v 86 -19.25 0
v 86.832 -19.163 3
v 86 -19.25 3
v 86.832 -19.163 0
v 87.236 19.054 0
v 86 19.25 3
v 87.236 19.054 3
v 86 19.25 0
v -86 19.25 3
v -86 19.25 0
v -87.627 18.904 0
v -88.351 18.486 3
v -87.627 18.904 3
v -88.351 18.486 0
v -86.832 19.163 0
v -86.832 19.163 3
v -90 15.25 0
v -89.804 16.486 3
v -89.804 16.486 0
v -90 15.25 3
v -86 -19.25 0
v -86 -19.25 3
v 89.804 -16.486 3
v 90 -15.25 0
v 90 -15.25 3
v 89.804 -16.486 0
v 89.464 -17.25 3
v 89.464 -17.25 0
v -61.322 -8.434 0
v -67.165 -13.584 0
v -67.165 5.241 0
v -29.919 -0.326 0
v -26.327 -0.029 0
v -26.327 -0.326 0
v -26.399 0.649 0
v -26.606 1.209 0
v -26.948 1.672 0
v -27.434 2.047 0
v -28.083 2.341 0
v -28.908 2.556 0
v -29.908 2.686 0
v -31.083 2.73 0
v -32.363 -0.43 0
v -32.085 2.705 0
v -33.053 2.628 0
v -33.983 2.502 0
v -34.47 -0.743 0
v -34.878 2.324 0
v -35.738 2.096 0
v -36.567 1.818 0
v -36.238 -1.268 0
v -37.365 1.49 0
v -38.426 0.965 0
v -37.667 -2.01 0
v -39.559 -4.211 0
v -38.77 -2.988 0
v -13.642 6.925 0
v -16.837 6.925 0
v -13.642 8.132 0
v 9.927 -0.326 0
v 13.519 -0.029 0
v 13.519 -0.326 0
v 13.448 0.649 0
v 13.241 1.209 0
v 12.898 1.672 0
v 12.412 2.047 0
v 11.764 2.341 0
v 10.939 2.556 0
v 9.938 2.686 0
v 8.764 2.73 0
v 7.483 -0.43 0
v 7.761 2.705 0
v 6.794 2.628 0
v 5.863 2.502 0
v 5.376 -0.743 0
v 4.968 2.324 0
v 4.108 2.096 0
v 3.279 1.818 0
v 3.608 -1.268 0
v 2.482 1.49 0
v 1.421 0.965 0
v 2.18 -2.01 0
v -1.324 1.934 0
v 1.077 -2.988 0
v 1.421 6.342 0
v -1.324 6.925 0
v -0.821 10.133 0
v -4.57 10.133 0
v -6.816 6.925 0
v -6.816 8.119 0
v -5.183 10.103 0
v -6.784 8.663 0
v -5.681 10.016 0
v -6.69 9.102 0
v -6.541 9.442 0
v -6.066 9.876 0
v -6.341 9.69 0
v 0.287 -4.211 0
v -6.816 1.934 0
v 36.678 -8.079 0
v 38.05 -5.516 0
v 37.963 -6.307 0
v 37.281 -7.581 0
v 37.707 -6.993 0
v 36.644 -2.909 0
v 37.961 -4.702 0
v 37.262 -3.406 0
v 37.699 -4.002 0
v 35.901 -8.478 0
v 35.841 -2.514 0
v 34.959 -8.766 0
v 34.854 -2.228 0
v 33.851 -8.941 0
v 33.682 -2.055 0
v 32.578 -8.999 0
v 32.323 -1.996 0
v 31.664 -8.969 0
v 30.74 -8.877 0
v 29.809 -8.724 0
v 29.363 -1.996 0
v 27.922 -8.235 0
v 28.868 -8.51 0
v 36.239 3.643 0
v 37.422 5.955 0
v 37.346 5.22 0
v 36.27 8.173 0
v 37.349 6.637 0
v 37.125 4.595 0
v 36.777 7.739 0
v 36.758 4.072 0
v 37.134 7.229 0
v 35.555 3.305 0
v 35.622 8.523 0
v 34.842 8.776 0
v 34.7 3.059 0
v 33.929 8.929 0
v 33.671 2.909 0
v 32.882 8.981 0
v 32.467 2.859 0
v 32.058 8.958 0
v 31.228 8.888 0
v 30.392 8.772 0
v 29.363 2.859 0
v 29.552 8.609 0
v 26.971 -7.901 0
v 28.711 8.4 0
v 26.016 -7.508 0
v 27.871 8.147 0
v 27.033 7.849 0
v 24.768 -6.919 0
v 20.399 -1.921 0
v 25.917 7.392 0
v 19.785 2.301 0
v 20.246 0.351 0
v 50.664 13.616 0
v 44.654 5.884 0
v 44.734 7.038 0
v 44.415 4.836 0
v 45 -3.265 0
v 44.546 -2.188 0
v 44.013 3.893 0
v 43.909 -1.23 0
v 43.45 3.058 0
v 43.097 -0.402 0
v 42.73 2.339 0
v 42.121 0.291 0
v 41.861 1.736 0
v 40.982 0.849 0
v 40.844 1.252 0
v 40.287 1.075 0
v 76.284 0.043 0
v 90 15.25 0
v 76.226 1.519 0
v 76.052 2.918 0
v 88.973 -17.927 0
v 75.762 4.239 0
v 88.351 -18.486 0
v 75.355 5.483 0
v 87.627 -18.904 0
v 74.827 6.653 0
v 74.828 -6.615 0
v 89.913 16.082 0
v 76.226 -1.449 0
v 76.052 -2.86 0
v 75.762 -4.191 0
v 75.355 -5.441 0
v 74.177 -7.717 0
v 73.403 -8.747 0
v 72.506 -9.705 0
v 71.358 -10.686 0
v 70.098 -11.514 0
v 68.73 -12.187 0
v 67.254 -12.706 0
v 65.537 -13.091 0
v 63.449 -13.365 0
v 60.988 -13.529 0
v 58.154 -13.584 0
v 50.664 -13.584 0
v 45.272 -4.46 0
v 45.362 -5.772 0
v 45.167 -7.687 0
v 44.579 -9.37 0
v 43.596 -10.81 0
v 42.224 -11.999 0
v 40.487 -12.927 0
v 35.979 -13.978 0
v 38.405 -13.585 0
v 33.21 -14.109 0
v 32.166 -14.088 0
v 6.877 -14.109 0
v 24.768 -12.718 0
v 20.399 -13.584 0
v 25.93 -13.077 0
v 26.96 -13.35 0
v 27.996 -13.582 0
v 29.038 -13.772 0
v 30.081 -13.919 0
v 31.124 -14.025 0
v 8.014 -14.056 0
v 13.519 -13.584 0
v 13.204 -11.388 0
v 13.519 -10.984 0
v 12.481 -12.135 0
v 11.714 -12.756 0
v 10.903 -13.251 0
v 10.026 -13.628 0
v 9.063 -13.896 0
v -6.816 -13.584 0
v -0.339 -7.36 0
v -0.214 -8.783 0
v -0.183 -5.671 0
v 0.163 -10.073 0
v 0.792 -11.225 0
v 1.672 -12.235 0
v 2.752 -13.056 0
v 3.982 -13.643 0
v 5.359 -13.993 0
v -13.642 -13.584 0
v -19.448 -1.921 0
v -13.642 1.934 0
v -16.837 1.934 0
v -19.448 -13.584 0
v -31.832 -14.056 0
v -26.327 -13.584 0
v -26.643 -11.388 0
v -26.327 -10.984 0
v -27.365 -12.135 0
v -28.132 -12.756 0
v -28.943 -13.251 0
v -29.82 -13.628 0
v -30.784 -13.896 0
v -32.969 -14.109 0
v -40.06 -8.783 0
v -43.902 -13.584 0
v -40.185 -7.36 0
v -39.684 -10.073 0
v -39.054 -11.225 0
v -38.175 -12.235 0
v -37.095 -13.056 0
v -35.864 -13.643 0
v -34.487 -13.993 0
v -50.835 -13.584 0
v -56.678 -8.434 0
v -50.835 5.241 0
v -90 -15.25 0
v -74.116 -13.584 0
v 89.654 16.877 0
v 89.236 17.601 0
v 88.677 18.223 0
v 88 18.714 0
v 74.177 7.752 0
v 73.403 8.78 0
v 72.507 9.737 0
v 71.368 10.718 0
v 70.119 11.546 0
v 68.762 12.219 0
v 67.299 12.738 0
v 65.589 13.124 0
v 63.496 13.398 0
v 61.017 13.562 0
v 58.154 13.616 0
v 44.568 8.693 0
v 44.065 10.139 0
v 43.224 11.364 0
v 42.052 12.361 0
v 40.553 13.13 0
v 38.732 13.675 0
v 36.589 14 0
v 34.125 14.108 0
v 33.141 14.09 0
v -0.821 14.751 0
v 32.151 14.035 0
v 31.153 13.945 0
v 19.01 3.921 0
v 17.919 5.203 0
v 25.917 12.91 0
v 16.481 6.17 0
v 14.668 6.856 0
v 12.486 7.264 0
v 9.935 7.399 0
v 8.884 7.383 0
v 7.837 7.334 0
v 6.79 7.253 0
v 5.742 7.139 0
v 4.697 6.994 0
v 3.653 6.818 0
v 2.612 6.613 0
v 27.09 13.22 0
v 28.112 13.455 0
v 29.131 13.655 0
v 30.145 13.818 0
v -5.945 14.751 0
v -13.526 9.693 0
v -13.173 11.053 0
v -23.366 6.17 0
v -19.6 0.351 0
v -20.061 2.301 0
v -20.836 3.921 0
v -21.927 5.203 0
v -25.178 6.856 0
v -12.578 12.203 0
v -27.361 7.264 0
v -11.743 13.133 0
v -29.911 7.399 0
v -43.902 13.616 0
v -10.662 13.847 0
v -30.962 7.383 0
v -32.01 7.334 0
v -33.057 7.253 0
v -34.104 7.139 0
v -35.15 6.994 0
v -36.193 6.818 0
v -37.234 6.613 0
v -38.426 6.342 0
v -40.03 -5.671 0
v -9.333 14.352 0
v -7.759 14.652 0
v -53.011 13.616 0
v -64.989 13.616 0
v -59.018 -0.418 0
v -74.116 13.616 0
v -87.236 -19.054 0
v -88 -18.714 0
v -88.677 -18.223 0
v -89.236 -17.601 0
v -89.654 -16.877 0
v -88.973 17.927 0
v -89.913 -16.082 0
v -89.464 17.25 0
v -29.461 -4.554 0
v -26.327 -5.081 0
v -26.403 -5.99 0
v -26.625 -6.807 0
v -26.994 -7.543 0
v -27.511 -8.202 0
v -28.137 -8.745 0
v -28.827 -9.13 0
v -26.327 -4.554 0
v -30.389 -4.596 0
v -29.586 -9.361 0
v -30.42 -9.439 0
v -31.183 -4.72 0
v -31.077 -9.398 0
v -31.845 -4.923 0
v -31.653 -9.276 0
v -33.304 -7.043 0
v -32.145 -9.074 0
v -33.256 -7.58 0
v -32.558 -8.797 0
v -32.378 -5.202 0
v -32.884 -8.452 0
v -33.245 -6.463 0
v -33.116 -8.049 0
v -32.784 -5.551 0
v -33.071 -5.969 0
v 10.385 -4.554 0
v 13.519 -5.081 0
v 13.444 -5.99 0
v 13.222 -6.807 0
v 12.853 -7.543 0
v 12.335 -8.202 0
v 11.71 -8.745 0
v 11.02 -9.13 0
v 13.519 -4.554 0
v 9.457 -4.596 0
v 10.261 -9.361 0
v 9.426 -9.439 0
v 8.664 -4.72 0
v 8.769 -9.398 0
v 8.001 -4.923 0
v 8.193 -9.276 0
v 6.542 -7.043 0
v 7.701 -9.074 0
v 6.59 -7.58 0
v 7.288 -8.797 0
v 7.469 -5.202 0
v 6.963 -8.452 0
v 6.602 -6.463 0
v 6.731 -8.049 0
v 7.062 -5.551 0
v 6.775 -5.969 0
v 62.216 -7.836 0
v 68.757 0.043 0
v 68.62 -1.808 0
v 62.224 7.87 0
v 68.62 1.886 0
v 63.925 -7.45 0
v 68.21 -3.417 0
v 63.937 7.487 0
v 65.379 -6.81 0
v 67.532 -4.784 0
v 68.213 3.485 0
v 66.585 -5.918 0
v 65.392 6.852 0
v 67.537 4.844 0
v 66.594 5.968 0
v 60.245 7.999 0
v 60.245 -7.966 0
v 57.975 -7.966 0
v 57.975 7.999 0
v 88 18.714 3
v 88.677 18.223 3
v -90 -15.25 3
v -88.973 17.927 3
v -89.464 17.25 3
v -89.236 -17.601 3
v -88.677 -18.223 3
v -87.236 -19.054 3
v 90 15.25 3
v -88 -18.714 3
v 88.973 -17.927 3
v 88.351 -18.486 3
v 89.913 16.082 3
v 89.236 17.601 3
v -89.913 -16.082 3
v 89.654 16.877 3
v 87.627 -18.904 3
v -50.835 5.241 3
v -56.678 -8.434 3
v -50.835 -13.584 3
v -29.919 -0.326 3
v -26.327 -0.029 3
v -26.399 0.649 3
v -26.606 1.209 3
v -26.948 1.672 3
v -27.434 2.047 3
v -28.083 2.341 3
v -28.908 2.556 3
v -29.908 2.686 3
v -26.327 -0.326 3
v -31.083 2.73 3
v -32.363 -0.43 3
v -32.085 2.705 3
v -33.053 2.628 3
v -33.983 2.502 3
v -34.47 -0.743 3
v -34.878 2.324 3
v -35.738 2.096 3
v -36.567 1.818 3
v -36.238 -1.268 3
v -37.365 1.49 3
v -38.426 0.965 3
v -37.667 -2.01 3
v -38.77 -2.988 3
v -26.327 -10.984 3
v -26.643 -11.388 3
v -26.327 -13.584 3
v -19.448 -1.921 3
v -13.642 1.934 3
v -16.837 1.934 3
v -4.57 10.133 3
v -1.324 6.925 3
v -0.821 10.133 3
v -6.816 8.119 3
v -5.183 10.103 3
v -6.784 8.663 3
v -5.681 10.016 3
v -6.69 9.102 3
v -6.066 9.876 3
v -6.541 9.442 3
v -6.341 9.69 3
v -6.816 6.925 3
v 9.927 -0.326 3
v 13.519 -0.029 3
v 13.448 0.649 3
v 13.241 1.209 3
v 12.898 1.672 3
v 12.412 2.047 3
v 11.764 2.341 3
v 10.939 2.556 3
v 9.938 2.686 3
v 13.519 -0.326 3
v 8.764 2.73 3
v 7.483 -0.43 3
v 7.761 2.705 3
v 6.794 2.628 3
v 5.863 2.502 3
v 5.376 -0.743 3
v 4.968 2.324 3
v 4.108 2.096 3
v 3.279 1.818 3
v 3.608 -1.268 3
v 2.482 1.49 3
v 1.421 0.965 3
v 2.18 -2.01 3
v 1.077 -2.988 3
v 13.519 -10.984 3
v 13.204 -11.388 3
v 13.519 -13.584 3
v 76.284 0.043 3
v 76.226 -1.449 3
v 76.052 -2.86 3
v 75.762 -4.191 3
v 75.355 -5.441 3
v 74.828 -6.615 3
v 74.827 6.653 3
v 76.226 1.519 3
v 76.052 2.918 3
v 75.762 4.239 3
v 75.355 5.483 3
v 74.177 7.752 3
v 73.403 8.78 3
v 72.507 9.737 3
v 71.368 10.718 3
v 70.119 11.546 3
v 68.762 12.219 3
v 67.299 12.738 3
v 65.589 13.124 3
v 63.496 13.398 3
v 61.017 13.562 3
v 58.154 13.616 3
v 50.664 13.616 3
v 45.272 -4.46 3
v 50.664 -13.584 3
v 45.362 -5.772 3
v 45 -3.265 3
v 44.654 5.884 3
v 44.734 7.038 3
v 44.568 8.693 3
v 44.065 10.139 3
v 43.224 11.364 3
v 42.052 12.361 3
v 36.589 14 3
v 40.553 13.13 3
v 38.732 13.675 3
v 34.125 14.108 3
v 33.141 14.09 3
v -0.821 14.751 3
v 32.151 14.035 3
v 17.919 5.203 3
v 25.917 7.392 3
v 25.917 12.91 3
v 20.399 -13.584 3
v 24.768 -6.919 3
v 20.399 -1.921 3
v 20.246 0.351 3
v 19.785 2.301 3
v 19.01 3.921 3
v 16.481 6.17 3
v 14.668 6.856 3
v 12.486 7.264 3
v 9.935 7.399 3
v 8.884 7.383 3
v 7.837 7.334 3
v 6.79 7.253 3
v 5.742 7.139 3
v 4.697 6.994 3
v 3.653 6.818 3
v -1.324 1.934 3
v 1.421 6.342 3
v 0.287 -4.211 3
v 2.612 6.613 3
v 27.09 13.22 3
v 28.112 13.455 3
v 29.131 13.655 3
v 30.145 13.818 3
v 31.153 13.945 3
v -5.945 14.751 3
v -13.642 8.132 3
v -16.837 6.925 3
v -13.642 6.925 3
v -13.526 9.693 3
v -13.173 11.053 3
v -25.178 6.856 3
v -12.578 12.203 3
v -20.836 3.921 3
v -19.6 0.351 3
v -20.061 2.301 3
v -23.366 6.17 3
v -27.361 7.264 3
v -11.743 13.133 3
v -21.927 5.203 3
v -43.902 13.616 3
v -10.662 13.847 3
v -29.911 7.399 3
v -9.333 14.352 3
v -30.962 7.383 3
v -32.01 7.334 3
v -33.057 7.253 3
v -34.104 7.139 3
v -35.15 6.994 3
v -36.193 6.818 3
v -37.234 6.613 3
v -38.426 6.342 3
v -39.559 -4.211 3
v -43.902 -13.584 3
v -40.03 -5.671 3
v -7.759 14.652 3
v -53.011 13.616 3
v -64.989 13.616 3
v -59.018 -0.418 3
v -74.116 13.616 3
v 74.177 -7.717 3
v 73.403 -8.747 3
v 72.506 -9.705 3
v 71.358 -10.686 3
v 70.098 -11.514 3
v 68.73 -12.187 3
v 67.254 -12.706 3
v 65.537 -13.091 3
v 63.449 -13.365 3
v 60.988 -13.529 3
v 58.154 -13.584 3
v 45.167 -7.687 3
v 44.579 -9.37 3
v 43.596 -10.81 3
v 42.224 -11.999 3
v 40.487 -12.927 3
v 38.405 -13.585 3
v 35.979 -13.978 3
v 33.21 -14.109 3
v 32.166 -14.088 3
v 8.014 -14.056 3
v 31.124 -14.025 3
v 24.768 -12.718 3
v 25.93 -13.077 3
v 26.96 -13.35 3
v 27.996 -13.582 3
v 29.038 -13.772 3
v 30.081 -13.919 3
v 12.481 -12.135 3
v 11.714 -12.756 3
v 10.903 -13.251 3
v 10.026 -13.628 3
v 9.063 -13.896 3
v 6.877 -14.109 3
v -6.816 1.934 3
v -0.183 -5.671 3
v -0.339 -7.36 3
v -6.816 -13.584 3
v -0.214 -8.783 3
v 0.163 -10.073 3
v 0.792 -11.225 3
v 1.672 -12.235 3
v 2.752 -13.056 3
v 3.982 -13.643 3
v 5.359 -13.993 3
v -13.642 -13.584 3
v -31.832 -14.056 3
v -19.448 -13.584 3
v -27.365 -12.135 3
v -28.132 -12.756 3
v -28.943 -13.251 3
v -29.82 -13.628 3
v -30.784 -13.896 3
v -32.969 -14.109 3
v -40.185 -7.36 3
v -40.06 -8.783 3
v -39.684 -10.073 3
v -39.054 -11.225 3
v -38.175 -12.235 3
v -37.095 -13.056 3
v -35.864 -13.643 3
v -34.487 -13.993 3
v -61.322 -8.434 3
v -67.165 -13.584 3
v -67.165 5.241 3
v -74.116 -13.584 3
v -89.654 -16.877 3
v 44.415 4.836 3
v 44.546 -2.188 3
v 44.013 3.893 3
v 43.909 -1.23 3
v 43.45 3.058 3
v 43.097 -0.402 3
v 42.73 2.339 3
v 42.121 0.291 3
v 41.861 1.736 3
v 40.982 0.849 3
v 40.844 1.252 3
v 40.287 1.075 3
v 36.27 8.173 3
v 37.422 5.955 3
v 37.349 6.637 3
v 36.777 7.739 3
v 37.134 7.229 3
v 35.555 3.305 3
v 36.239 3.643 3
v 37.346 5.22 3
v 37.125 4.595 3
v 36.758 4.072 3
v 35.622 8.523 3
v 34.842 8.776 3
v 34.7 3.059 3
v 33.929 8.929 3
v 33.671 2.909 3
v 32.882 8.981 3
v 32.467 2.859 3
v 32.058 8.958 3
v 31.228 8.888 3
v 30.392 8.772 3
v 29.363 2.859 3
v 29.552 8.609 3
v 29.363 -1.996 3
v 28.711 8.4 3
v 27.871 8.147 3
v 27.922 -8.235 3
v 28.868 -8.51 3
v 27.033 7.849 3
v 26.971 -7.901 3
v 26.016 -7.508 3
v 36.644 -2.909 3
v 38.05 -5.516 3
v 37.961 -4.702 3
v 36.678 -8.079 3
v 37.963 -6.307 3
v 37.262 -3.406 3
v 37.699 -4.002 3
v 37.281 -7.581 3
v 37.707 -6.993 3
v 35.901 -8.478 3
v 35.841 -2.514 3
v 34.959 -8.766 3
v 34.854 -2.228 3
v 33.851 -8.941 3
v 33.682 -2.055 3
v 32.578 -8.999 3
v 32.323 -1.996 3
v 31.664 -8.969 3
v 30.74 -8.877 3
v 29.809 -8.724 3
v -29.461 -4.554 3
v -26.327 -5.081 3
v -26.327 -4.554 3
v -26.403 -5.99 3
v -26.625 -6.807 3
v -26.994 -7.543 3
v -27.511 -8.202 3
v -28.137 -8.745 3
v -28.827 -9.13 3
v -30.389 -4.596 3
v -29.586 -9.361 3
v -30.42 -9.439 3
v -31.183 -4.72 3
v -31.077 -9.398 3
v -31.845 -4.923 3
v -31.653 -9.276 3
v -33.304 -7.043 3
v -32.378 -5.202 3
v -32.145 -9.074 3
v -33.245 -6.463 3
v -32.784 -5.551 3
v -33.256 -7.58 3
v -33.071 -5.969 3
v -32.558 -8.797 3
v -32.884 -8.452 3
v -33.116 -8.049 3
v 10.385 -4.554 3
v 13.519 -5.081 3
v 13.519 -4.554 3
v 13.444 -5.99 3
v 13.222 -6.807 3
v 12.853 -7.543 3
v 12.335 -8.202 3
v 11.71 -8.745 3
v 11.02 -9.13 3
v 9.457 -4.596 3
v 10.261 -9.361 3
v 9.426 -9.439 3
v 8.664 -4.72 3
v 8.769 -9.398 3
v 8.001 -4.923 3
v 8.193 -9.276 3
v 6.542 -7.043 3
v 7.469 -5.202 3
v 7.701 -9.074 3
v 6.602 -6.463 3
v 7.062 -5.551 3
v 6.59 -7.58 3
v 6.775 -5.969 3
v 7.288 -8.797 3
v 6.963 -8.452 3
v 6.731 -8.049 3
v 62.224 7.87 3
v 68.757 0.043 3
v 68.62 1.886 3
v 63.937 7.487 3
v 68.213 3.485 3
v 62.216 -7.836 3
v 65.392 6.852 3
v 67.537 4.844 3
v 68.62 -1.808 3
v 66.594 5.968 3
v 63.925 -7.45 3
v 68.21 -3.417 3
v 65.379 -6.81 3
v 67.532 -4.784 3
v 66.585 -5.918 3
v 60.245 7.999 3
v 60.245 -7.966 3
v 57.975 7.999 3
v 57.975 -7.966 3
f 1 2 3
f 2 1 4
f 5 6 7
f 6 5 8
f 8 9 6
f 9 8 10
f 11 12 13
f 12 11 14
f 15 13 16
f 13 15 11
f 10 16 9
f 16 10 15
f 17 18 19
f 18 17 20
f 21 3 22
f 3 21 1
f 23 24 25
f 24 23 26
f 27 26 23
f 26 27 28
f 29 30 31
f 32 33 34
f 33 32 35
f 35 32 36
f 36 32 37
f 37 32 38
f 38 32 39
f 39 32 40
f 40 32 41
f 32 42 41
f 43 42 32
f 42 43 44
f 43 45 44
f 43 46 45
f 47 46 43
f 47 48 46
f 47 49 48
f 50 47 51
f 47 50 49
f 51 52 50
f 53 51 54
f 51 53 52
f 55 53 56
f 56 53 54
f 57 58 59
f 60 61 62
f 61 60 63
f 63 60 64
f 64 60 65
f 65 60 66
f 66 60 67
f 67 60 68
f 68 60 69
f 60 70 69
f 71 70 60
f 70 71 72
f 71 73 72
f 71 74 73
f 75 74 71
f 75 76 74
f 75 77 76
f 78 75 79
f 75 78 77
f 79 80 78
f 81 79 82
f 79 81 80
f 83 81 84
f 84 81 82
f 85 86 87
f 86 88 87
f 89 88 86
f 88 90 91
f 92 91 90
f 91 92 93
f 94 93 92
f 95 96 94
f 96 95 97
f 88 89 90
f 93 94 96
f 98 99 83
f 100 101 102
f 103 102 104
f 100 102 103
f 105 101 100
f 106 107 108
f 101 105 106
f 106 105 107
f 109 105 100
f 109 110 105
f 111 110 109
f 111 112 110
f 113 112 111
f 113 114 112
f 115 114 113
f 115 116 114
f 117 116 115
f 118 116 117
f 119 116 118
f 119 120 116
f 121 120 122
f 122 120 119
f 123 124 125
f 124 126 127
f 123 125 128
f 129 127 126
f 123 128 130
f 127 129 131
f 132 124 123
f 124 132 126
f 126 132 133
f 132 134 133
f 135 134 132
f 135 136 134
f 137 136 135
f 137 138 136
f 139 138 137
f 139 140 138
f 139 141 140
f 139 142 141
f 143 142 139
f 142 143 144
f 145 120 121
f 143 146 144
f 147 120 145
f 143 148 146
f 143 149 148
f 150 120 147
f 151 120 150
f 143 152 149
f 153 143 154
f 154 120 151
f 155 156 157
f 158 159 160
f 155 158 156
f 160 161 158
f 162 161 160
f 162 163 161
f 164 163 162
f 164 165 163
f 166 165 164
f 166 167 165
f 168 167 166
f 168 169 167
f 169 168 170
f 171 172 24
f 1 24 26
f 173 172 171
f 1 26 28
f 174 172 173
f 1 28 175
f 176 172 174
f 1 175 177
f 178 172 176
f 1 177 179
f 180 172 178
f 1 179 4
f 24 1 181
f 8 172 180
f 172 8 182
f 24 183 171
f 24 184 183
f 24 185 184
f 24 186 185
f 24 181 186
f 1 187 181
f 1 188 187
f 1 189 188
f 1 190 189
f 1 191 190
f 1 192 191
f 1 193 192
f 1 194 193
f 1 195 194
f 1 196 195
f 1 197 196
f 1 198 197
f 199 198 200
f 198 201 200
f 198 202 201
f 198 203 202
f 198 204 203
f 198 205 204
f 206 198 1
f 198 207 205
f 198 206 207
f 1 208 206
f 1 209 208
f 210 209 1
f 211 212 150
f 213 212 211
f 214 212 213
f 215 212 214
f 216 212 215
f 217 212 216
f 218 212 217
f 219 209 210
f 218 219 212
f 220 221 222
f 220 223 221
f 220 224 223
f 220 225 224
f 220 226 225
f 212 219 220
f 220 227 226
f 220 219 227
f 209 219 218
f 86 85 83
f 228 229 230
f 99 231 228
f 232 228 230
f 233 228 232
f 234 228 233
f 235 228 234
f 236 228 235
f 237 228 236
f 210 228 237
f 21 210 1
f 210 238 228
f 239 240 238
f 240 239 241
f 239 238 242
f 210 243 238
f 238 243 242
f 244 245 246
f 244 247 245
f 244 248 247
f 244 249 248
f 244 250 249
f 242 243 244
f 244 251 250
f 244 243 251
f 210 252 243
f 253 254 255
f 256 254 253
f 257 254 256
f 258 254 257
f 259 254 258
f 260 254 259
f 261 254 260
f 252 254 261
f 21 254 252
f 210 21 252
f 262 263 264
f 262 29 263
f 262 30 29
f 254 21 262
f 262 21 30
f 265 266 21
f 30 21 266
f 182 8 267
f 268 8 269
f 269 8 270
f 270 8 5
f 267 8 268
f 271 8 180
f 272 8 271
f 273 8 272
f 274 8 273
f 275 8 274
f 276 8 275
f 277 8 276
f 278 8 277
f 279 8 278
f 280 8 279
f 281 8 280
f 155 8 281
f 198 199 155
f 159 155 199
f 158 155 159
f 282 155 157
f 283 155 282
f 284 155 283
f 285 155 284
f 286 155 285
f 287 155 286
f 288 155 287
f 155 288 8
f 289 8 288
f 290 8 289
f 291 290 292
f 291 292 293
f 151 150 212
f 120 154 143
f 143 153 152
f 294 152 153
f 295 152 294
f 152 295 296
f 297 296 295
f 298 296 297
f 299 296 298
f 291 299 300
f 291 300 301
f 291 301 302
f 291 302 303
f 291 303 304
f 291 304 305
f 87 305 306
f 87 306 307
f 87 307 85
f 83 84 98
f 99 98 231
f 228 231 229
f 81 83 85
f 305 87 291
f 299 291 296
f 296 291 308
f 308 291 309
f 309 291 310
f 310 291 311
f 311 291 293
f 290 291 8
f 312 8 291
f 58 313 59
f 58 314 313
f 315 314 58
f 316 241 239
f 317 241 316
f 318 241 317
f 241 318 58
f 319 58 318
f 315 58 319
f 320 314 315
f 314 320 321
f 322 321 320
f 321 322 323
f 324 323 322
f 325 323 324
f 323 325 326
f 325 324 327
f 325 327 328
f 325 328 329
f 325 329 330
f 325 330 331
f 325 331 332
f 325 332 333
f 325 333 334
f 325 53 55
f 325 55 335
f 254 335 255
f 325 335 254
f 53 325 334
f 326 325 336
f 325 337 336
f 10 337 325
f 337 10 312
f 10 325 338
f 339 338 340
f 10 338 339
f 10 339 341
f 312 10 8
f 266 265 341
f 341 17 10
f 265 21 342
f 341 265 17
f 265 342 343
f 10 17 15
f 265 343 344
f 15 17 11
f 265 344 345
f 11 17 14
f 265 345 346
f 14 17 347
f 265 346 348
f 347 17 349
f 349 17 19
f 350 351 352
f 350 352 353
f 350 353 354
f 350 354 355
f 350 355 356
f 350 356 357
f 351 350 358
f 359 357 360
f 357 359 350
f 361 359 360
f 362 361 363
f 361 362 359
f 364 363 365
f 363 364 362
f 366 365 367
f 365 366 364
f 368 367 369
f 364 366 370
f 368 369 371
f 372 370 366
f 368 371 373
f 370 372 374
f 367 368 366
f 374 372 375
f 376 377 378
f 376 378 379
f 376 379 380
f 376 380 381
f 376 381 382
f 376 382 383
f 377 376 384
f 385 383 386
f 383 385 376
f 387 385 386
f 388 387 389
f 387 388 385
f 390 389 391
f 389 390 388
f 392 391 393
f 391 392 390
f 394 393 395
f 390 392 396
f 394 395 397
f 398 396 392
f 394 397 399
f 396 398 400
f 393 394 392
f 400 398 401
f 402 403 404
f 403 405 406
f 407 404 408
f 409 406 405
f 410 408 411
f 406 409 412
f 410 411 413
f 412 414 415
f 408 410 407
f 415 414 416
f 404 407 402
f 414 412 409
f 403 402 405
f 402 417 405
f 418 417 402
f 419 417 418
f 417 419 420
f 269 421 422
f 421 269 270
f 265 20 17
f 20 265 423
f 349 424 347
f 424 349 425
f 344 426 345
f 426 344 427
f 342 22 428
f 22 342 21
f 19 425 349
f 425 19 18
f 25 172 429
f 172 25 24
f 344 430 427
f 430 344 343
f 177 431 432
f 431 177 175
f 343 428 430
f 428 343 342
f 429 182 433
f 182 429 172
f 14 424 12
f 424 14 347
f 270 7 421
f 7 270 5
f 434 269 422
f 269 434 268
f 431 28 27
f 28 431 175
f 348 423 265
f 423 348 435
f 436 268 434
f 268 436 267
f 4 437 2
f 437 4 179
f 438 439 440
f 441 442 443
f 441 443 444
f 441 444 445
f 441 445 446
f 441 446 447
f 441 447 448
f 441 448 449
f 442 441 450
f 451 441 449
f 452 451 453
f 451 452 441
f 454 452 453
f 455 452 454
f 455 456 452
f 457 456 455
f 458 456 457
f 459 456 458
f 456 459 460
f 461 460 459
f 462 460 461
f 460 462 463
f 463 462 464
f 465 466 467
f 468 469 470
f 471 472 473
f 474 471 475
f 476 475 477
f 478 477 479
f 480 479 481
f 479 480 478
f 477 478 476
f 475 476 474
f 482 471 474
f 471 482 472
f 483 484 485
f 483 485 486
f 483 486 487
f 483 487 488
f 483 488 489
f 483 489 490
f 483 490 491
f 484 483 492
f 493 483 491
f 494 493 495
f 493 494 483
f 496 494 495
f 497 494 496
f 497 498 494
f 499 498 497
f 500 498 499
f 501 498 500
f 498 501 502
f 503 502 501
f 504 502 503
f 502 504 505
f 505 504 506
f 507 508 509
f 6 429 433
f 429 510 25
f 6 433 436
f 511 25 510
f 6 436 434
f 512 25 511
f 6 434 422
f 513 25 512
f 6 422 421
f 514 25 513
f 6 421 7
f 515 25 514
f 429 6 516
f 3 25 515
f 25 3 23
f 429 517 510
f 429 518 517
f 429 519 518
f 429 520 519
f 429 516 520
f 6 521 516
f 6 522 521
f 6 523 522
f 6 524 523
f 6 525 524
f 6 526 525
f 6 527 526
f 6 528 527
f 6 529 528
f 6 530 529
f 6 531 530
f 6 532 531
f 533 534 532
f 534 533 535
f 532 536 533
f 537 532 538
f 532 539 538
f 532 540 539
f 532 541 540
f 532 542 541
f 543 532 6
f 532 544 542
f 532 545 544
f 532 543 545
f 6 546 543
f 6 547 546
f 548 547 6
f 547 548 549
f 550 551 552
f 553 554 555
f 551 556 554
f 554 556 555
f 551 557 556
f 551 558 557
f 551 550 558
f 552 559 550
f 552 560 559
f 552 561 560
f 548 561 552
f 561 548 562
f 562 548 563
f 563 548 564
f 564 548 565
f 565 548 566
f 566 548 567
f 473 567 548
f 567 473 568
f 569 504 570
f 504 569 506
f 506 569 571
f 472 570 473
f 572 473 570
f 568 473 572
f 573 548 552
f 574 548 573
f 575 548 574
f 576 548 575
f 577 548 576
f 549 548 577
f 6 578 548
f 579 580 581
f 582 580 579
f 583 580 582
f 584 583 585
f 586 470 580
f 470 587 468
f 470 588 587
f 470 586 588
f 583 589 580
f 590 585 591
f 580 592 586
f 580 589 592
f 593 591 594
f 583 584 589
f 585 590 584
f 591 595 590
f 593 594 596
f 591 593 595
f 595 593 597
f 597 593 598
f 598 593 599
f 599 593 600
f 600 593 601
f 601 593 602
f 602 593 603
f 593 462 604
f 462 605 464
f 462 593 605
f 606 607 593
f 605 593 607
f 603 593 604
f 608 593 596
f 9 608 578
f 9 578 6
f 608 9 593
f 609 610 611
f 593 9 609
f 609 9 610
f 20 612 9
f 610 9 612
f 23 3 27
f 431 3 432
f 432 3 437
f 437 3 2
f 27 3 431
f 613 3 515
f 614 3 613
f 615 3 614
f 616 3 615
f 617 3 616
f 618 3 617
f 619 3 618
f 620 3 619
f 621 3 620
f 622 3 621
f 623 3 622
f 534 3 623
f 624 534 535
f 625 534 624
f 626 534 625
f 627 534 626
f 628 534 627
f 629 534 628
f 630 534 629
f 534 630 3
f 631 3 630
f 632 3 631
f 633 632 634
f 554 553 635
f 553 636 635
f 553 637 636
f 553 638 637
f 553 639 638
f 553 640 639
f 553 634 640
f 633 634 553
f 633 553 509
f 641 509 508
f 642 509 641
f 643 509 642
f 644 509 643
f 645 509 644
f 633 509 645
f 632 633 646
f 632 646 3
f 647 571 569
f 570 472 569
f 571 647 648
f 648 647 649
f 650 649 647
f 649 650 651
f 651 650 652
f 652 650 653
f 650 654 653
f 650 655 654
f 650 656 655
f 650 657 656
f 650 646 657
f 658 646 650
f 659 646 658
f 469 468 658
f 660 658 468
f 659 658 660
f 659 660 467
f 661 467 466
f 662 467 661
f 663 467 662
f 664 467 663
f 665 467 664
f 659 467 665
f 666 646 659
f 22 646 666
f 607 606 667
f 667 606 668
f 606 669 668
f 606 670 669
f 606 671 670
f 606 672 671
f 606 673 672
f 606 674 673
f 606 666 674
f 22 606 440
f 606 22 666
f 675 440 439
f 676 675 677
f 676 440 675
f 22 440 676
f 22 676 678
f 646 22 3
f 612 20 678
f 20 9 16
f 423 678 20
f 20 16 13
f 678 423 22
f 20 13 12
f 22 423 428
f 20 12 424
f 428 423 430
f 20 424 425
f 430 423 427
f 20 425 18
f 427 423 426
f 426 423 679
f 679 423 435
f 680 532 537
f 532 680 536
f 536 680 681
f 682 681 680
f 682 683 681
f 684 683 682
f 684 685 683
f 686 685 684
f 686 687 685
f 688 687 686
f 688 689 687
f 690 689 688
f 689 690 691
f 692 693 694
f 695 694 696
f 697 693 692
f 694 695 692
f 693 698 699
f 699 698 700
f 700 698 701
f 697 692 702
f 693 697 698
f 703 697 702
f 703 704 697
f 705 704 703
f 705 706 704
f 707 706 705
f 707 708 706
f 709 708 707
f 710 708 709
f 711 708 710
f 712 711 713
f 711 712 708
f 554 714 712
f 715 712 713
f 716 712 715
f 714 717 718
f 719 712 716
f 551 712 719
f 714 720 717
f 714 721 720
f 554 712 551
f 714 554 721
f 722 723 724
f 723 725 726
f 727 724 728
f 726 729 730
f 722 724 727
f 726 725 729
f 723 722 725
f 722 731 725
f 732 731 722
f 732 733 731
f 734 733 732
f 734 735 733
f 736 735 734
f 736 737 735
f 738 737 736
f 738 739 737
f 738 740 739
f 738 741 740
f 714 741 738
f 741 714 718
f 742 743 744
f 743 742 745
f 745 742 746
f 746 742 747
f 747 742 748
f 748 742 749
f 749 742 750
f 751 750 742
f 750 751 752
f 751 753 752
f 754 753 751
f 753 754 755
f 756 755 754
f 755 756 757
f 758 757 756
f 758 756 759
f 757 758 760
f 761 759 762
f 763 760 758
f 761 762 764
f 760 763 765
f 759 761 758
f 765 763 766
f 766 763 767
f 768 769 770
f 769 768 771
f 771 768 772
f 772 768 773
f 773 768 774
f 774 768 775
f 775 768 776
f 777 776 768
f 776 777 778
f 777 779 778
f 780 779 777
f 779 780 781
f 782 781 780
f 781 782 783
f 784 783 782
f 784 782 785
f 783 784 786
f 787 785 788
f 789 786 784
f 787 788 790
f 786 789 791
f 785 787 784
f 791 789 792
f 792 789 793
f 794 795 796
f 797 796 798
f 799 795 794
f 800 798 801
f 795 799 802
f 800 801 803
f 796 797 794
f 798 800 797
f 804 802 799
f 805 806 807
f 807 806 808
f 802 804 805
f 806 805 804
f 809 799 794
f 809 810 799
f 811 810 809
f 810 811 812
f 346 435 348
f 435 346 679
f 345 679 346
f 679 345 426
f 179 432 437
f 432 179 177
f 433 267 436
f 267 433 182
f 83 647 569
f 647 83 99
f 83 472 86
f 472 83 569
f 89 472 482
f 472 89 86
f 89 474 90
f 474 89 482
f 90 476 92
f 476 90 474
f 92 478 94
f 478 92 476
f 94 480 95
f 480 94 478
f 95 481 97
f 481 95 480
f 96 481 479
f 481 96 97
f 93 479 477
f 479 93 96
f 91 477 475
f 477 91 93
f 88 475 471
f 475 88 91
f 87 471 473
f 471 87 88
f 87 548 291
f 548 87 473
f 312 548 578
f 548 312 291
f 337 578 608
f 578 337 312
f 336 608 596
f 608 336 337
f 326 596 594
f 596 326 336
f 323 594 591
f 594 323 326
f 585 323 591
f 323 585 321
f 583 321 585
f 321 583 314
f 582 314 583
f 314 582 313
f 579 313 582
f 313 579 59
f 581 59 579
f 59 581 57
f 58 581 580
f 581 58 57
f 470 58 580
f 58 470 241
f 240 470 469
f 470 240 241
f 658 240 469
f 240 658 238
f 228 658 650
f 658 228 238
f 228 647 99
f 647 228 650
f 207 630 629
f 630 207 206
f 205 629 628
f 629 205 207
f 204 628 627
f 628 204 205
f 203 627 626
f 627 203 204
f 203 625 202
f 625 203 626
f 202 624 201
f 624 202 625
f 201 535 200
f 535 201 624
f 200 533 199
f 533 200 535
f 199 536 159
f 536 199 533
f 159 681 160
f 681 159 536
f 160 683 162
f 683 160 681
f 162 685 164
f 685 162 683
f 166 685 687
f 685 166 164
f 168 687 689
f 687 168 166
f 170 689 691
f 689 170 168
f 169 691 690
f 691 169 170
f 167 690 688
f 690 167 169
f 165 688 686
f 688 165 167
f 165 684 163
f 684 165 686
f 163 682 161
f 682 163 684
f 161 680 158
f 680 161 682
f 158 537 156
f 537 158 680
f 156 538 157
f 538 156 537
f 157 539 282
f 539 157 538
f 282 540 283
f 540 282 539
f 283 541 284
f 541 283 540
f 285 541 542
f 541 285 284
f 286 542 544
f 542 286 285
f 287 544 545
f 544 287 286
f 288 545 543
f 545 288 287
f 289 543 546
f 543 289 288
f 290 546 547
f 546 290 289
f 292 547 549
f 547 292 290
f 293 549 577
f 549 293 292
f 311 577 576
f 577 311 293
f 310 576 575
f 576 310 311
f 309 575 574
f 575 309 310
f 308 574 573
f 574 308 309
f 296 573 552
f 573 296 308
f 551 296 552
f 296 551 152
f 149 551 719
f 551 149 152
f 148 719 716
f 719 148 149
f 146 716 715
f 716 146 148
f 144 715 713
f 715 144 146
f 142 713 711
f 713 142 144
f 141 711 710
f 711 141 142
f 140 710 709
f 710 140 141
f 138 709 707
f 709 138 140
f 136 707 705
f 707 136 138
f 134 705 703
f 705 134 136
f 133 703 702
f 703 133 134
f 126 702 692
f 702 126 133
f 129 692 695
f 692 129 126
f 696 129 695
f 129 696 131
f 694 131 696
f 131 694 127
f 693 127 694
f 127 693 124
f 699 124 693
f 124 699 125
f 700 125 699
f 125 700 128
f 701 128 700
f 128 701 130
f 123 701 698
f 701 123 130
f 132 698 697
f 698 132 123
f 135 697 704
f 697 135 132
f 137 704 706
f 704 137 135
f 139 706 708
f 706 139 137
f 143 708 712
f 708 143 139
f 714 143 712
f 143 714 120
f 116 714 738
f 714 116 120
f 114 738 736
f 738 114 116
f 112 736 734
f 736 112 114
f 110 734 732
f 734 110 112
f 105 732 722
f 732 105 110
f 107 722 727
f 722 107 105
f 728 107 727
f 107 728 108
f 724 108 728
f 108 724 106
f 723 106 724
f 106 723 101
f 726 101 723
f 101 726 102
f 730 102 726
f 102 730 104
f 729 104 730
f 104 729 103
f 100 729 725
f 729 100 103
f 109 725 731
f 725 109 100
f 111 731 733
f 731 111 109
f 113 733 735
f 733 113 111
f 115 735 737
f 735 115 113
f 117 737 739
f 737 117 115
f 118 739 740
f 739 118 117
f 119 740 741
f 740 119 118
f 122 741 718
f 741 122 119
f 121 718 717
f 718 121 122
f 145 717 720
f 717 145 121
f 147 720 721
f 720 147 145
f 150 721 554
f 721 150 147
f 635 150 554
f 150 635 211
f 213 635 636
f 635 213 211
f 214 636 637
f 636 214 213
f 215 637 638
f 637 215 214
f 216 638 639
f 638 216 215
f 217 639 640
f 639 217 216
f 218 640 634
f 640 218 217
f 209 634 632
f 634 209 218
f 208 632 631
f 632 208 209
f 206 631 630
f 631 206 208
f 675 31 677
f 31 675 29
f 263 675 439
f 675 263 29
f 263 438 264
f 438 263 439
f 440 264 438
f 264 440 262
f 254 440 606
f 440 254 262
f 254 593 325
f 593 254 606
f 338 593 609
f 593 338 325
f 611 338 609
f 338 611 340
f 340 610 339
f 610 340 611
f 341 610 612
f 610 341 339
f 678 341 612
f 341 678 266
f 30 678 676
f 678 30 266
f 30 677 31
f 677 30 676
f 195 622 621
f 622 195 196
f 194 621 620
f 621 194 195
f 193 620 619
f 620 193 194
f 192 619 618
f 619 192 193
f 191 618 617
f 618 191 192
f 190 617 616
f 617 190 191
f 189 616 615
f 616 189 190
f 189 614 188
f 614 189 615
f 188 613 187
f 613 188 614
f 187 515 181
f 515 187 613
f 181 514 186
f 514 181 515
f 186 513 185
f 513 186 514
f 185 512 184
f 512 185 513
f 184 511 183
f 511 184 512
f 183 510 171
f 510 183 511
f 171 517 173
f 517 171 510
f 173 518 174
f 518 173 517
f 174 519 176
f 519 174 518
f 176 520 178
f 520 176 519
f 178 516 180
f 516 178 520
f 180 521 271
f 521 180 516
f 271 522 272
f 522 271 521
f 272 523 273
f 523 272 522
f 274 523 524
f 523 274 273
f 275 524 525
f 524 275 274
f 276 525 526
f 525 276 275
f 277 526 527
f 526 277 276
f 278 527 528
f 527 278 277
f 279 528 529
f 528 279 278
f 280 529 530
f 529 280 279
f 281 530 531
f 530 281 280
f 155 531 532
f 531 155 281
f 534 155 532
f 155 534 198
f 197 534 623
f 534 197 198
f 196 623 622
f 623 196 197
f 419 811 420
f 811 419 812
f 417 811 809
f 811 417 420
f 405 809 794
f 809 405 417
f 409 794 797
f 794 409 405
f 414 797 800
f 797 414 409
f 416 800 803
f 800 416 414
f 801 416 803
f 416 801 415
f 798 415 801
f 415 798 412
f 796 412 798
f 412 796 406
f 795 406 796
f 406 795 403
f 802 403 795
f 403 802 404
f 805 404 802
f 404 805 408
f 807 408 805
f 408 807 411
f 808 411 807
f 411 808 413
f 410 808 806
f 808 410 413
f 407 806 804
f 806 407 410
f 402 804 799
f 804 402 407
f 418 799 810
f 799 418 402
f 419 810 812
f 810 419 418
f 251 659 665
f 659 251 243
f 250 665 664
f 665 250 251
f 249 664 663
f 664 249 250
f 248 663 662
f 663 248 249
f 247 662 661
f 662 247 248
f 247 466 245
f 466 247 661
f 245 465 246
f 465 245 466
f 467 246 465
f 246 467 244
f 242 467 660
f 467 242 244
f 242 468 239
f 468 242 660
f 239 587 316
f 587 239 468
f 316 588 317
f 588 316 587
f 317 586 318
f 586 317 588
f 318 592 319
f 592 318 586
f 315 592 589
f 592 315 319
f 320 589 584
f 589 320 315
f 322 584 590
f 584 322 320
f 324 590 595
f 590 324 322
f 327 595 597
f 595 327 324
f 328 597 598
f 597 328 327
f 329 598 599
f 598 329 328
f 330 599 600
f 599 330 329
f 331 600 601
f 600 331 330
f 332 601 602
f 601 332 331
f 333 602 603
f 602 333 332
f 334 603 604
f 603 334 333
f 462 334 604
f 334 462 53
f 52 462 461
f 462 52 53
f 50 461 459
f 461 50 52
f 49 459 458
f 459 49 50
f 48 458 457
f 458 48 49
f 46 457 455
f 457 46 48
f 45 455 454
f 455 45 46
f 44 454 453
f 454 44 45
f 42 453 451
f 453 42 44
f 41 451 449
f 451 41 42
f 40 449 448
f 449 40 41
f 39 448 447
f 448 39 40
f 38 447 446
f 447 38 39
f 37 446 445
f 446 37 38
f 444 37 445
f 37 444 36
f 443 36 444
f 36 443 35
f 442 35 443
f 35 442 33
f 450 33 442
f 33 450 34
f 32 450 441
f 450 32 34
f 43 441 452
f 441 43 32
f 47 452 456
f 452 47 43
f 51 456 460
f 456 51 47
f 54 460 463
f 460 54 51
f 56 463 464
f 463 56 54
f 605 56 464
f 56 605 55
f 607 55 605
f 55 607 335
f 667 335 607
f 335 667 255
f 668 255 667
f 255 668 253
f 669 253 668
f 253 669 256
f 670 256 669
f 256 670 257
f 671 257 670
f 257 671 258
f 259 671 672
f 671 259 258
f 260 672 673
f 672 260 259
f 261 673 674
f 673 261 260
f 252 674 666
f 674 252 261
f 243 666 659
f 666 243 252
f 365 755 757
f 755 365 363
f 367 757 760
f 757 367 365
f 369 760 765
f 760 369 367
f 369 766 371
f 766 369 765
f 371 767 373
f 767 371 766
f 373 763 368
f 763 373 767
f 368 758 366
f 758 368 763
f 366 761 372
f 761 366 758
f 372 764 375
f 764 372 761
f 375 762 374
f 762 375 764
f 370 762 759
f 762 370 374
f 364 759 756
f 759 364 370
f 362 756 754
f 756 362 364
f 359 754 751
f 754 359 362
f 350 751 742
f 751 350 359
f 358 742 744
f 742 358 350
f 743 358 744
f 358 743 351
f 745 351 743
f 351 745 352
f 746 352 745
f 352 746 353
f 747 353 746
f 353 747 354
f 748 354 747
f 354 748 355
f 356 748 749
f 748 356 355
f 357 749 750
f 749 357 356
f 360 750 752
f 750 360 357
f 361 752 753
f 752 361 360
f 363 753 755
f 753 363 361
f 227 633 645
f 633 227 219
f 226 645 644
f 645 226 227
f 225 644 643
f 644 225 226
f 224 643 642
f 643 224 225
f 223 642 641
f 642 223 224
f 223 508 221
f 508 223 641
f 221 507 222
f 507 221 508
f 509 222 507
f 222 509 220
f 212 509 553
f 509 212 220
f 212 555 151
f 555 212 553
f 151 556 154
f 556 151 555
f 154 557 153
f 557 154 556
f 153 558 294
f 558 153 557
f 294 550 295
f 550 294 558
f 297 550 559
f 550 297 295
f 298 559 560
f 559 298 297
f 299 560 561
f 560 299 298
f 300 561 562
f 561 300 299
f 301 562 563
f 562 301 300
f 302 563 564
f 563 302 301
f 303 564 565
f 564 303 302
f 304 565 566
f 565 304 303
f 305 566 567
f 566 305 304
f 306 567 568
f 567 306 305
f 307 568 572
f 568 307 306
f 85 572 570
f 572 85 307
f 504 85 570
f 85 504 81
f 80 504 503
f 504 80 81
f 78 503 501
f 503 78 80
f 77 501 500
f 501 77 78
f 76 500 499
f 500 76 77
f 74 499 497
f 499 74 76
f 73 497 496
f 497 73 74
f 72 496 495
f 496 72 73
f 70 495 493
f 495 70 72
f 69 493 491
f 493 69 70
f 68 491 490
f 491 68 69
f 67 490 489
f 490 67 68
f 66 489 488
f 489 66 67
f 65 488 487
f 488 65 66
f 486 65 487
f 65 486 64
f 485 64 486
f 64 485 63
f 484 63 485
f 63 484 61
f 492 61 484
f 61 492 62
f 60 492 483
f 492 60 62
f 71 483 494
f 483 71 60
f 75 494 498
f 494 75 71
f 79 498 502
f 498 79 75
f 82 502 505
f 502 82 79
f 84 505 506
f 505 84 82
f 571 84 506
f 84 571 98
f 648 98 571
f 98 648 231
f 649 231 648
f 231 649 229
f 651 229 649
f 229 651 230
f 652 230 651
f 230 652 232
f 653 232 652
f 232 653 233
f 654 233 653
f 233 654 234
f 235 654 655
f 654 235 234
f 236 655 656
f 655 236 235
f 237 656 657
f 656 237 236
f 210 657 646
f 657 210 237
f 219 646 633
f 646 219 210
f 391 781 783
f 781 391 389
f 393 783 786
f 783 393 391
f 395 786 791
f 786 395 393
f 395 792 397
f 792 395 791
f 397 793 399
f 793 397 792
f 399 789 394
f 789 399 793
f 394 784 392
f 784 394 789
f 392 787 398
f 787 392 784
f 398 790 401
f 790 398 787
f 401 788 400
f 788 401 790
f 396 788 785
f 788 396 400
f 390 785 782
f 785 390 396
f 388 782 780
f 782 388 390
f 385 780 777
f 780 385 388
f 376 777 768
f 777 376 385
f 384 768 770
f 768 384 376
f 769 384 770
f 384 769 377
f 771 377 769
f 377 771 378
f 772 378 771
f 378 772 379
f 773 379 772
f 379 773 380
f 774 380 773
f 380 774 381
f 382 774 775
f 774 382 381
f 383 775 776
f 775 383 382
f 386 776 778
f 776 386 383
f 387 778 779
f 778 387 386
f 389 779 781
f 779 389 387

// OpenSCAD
// Word Sign - 2 Layers
// Parametric word sign with 2 color layers (Base, Top)

// --- Parameters ---
Text        = "Mafa3D";
Font        = "Bebas Neue";
Target_Size = 150;
Base_Width  = 180;
Offset      = 2;
Tolerance   = 0.2;
Base_Height = 3;
Layer_Height = 4;
Part        = "Base";

$fn = 30;
padding = 8;

base_h = max(Layer_Height * 0.6, Target_Size * 0.15);
bw = Base_Width;
bd = base_h + padding * 2;

module text_shape(txt, fnt) {
  resize([Target_Size, 0, 0], auto=true)
  text(txt, size=40, font=fnt, halign="center", valign="center");
}

module base_plate() {
  offset(r=4) offset(-4)
  square([bw, bd], center=true);
}

module base_part() {
  difference() {
    linear_extrude(Base_Height)
    base_plate();

    translate([0, 0, Base_Height - Layer_Height + Tolerance])
    linear_extrude(Layer_Height + 1)
    offset(delta=Tolerance)
    text_shape(Text, str(Font, ":style=Bold"));
  }
}

module top_part() {
  linear_extrude(Layer_Height)
  text_shape(Text, str(Font, ":style=Bold"));
}

if (Part == "Base") {
  base_part();
} else if (Part == "Top") {
  translate([0, 0, Base_Height])
  top_part();
}
